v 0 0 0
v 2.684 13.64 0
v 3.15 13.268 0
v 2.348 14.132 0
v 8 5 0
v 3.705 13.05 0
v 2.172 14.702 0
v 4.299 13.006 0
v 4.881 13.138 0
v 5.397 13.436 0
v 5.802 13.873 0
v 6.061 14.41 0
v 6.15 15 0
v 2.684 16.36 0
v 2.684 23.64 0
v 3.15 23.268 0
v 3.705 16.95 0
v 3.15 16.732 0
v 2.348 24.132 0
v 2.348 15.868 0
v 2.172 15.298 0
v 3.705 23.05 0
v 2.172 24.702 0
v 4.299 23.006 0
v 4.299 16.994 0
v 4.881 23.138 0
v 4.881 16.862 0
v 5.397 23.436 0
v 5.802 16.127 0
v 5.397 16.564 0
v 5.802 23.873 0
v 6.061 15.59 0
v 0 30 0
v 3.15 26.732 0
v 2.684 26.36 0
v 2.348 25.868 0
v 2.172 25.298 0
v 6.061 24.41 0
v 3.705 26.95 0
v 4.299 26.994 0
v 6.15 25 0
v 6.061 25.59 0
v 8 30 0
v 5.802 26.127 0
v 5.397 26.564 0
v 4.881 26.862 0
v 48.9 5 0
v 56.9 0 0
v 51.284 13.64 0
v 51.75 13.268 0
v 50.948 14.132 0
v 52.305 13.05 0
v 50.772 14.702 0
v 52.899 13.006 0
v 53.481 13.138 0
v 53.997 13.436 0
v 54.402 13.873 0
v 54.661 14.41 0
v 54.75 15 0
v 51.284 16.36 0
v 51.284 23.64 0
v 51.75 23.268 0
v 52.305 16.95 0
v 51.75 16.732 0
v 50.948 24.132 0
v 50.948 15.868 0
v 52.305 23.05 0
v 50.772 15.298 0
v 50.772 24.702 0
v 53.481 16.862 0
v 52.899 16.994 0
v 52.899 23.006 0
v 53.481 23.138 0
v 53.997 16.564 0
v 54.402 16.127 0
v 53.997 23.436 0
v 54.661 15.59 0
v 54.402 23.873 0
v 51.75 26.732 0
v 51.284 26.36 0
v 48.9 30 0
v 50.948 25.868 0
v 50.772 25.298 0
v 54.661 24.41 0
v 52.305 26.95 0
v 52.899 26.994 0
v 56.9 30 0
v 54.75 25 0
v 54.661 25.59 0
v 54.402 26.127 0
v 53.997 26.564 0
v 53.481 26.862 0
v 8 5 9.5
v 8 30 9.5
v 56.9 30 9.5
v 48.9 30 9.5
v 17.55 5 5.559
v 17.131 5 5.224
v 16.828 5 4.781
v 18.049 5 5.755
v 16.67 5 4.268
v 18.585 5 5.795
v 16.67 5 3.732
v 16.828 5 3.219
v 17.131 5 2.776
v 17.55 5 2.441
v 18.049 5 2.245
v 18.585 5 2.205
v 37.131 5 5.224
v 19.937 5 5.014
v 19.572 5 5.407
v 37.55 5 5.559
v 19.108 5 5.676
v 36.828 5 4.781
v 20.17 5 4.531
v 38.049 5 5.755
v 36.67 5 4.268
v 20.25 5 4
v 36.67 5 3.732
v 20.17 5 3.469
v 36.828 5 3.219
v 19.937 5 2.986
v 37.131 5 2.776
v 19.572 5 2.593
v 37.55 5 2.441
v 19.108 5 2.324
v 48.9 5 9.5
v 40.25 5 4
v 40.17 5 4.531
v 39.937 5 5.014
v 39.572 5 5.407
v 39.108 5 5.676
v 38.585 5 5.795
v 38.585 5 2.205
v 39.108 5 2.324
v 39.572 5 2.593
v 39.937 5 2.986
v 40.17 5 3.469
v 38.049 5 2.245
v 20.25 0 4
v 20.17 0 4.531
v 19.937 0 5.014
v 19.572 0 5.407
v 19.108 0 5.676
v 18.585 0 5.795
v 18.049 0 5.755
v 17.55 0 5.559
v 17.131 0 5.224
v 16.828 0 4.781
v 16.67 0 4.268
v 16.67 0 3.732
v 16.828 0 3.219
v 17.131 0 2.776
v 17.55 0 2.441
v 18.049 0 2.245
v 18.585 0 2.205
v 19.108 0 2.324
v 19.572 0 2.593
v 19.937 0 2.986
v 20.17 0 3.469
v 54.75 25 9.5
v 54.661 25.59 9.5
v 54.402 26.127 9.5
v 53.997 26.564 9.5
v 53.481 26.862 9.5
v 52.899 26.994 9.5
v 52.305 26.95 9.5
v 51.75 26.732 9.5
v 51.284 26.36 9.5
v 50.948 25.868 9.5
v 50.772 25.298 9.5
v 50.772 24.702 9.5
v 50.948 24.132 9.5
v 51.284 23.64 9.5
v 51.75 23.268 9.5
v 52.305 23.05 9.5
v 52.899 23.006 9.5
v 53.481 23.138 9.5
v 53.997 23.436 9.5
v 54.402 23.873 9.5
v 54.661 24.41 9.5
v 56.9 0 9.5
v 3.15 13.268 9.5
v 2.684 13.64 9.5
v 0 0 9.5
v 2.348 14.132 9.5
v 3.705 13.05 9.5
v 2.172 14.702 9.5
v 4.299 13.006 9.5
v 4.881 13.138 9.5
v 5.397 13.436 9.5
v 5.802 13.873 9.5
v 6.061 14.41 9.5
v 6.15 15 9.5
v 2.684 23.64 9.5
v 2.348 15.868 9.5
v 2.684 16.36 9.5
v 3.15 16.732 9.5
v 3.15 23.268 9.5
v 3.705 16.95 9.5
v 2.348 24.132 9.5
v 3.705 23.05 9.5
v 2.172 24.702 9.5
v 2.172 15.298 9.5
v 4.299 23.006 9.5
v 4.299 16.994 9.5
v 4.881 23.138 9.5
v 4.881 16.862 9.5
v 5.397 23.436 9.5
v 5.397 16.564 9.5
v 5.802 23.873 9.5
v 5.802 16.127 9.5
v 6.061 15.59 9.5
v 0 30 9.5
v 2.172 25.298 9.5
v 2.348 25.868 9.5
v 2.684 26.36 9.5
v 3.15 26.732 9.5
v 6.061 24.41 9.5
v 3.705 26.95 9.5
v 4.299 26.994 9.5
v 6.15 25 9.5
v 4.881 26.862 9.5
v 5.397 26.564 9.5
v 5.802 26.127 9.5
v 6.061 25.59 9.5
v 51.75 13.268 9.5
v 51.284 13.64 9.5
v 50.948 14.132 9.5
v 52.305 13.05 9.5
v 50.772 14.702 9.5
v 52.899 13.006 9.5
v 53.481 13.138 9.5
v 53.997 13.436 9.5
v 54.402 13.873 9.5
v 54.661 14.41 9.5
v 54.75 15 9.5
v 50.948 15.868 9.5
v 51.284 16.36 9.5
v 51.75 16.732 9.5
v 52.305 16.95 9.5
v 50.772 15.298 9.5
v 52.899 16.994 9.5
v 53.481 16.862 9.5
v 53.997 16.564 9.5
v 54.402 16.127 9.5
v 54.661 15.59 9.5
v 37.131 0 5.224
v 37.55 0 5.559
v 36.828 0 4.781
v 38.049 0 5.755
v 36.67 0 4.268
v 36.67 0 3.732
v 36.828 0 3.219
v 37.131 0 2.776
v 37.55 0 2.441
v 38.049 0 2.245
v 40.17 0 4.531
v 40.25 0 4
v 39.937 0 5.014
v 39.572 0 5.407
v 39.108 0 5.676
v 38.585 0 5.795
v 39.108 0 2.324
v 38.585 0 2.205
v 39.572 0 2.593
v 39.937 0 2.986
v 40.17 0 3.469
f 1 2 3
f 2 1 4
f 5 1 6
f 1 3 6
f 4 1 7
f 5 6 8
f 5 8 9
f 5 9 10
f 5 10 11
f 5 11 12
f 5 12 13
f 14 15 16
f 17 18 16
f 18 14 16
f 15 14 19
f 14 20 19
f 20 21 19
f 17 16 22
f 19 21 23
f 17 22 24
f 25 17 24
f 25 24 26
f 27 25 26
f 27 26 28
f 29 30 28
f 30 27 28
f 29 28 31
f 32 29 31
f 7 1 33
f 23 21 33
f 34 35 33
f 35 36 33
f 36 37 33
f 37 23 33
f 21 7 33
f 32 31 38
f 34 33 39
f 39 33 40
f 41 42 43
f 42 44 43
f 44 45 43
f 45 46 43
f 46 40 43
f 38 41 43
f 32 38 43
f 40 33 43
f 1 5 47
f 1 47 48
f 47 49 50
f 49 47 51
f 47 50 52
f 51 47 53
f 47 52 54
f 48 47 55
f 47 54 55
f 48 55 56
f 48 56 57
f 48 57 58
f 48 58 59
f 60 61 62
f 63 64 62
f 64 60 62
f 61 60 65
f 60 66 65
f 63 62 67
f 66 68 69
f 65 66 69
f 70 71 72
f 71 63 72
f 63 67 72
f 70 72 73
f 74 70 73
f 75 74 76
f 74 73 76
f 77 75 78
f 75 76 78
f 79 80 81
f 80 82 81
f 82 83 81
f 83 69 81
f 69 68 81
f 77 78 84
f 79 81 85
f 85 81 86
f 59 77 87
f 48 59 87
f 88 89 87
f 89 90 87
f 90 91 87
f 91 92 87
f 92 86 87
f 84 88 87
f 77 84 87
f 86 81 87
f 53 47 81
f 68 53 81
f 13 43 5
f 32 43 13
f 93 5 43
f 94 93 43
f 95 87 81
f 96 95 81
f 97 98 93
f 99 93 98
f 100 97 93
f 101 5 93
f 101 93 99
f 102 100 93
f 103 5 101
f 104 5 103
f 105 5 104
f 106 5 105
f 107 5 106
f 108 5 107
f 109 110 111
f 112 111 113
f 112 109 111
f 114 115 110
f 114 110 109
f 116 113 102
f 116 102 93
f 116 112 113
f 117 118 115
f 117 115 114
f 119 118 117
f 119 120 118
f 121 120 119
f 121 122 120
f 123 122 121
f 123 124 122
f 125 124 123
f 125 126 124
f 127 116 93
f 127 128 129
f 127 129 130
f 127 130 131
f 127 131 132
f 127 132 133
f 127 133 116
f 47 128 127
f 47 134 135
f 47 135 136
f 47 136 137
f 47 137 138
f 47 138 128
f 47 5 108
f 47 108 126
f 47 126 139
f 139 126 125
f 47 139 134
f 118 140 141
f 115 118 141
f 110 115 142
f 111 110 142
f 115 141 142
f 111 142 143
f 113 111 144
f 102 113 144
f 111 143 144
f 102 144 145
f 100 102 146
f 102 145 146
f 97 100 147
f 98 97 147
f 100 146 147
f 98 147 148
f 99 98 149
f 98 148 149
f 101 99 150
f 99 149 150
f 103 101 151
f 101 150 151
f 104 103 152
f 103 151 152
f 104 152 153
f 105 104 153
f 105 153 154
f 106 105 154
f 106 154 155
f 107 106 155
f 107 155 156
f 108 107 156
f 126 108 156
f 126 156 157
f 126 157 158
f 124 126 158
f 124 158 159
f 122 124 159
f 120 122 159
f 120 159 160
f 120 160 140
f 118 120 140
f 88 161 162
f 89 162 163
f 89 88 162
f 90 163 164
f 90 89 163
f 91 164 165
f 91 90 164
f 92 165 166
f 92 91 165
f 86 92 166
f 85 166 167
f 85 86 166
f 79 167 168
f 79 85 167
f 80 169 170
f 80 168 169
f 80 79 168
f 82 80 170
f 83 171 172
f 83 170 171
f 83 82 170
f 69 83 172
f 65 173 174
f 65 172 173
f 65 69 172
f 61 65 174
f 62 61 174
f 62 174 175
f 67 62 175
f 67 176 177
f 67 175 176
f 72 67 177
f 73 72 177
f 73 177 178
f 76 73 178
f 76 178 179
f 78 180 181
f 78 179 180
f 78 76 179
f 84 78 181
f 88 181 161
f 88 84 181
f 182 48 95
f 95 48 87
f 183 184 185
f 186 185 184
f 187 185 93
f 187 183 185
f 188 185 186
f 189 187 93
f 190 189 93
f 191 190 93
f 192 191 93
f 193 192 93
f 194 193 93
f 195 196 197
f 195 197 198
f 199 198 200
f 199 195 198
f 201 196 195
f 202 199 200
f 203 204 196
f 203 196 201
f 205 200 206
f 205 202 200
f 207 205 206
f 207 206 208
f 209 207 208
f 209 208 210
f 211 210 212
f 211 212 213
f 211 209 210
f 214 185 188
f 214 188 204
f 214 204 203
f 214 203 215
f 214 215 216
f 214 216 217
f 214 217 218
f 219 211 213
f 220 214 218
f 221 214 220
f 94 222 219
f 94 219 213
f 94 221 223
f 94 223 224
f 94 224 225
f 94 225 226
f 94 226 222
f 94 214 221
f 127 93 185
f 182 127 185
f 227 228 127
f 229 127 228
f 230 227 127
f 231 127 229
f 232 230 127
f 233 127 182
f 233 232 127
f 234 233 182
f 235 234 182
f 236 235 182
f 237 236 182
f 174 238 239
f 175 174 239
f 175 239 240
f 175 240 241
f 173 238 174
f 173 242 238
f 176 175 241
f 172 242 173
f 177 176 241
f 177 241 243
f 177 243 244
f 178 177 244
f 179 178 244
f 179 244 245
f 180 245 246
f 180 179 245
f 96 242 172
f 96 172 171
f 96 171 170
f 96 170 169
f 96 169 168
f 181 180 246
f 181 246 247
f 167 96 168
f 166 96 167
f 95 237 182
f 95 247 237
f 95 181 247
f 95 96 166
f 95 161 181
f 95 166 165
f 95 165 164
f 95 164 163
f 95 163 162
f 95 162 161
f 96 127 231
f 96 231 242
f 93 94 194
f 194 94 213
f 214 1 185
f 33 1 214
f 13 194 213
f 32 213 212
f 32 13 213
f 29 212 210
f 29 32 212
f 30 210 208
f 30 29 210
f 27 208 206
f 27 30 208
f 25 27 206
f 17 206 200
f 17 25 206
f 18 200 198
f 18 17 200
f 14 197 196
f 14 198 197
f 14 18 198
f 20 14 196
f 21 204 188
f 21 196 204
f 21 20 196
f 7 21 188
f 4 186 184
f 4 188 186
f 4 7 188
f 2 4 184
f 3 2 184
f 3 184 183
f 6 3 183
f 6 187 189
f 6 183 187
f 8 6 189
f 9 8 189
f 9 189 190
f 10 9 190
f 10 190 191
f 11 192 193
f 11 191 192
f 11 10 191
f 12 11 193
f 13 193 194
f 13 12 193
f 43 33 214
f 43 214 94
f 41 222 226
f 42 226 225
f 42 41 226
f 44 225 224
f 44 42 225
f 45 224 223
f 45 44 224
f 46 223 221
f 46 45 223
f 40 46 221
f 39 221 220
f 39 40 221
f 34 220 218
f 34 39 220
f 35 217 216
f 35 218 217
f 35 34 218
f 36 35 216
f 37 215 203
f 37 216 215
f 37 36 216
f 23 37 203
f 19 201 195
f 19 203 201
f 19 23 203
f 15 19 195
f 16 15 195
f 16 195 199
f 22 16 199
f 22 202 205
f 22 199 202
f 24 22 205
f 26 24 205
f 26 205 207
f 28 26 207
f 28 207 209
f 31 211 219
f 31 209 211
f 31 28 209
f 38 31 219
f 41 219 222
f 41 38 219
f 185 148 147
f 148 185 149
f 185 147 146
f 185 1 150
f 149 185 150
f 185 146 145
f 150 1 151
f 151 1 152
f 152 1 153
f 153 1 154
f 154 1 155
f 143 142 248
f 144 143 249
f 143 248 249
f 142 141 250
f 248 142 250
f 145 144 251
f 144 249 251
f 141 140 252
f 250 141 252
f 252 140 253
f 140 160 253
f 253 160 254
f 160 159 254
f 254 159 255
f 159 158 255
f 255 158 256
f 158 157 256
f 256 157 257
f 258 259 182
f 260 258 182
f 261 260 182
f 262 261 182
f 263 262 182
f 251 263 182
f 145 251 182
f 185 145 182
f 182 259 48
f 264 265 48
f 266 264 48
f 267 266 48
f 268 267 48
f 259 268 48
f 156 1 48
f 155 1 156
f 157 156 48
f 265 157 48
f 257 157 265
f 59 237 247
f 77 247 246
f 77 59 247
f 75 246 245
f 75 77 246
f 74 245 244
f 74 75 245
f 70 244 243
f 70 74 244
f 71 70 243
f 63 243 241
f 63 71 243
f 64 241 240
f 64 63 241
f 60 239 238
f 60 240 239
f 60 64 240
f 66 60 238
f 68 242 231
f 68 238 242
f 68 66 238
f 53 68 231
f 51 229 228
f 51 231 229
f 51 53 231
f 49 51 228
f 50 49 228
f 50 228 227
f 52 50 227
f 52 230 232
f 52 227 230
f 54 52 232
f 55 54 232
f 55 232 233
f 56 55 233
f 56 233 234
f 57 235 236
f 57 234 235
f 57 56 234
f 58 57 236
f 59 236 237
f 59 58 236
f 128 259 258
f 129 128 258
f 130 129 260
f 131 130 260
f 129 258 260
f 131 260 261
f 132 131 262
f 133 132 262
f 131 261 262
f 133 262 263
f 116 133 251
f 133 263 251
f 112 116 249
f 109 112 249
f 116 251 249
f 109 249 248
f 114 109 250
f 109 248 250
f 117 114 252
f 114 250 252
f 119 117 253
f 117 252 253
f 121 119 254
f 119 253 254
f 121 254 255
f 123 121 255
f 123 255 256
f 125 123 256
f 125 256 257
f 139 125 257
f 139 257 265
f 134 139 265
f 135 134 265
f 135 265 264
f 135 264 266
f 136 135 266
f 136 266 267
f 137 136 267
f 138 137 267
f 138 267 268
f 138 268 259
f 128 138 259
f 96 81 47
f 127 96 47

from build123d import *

# Parameters (mm, degrees)
ESQUISSE1_W             = 40.9
ESQUISSE1_H             = 5
ESQUISSE1_W_2           = 8
ESQUISSE1_H_2           = 30
ESQUISSE1_R             = 2
BOSS_EXTRU_1_DEPTH      = 11
ESQUISSE2_R             = 1.8
ENL_V_MAT_EXTRU_1_DEPTH = 9
ESQUISSE3_W             = 56.9
ESQUISSE3_H             = 30
ENL_V_MAT_EXTRU_2_DEPTH = 1.5


with BuildPart() as part:
    # Esquisse1 → Boss.-Extru.1 (new body)
    # profile 1 of 3: a face of its own
    with BuildSketch(Plane.XY):
        with Locations((28.45, 2.5)):
            Rectangle(ESQUISSE1_W, ESQUISSE1_H)
    # profile 2 of 3: a face of its own
    with BuildSketch(Plane.XY):
        with Locations((4, 15)):
            Rectangle(ESQUISSE1_W_2, ESQUISSE1_H_2)
        with Locations((4.15, 15)):
            Circle(ESQUISSE1_R, mode=Mode.SUBTRACT)
        with Locations((4.15, 25)):
            Circle(ESQUISSE1_R, mode=Mode.SUBTRACT)
    # profile 3 of 3: a face of its own
    with BuildSketch(Plane.XY):
        Polygon((48.9, 5), (48.9, 0), (56.9, 0), (56.9, 30), (48.9, 30), align=None)
        with Locations((52.75, 15)):
            Circle(ESQUISSE1_R, mode=Mode.SUBTRACT)
        with Locations((52.75, 25)):
            Circle(ESQUISSE1_R, mode=Mode.SUBTRACT)
    extrude(amount=BOSS_EXTRU_1_DEPTH)

    # Esquisse2 → Enlèv. mat.-Extru.1 (cut)
    with BuildSketch(Plane.XZ):
        with Locations((18.45, 4)):
            Circle(ESQUISSE2_R)
        with Locations((38.45, 4)):
            Circle(ESQUISSE2_R)
    extrude(amount=-ENL_V_MAT_EXTRU_1_DEPTH, mode=Mode.SUBTRACT)

    # Esquisse3 → Enlèv. mat.-Extru.2 (cut)
    with BuildSketch(Plane.XY.offset(11)):
        with Locations((28.45, 15)):
            Rectangle(ESQUISSE3_W, ESQUISSE3_H)
    extrude(amount=-ENL_V_MAT_EXTRU_2_DEPTH, mode=Mode.SUBTRACT)


solid = part.part
